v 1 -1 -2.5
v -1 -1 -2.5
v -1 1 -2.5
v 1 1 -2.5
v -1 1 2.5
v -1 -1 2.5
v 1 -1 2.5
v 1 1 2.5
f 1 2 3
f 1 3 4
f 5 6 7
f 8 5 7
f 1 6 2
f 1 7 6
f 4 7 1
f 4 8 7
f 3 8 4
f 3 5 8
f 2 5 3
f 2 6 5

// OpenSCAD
// centered linear extrusion
linear_extrude(height = 5, center = true) square(2, center = true);
